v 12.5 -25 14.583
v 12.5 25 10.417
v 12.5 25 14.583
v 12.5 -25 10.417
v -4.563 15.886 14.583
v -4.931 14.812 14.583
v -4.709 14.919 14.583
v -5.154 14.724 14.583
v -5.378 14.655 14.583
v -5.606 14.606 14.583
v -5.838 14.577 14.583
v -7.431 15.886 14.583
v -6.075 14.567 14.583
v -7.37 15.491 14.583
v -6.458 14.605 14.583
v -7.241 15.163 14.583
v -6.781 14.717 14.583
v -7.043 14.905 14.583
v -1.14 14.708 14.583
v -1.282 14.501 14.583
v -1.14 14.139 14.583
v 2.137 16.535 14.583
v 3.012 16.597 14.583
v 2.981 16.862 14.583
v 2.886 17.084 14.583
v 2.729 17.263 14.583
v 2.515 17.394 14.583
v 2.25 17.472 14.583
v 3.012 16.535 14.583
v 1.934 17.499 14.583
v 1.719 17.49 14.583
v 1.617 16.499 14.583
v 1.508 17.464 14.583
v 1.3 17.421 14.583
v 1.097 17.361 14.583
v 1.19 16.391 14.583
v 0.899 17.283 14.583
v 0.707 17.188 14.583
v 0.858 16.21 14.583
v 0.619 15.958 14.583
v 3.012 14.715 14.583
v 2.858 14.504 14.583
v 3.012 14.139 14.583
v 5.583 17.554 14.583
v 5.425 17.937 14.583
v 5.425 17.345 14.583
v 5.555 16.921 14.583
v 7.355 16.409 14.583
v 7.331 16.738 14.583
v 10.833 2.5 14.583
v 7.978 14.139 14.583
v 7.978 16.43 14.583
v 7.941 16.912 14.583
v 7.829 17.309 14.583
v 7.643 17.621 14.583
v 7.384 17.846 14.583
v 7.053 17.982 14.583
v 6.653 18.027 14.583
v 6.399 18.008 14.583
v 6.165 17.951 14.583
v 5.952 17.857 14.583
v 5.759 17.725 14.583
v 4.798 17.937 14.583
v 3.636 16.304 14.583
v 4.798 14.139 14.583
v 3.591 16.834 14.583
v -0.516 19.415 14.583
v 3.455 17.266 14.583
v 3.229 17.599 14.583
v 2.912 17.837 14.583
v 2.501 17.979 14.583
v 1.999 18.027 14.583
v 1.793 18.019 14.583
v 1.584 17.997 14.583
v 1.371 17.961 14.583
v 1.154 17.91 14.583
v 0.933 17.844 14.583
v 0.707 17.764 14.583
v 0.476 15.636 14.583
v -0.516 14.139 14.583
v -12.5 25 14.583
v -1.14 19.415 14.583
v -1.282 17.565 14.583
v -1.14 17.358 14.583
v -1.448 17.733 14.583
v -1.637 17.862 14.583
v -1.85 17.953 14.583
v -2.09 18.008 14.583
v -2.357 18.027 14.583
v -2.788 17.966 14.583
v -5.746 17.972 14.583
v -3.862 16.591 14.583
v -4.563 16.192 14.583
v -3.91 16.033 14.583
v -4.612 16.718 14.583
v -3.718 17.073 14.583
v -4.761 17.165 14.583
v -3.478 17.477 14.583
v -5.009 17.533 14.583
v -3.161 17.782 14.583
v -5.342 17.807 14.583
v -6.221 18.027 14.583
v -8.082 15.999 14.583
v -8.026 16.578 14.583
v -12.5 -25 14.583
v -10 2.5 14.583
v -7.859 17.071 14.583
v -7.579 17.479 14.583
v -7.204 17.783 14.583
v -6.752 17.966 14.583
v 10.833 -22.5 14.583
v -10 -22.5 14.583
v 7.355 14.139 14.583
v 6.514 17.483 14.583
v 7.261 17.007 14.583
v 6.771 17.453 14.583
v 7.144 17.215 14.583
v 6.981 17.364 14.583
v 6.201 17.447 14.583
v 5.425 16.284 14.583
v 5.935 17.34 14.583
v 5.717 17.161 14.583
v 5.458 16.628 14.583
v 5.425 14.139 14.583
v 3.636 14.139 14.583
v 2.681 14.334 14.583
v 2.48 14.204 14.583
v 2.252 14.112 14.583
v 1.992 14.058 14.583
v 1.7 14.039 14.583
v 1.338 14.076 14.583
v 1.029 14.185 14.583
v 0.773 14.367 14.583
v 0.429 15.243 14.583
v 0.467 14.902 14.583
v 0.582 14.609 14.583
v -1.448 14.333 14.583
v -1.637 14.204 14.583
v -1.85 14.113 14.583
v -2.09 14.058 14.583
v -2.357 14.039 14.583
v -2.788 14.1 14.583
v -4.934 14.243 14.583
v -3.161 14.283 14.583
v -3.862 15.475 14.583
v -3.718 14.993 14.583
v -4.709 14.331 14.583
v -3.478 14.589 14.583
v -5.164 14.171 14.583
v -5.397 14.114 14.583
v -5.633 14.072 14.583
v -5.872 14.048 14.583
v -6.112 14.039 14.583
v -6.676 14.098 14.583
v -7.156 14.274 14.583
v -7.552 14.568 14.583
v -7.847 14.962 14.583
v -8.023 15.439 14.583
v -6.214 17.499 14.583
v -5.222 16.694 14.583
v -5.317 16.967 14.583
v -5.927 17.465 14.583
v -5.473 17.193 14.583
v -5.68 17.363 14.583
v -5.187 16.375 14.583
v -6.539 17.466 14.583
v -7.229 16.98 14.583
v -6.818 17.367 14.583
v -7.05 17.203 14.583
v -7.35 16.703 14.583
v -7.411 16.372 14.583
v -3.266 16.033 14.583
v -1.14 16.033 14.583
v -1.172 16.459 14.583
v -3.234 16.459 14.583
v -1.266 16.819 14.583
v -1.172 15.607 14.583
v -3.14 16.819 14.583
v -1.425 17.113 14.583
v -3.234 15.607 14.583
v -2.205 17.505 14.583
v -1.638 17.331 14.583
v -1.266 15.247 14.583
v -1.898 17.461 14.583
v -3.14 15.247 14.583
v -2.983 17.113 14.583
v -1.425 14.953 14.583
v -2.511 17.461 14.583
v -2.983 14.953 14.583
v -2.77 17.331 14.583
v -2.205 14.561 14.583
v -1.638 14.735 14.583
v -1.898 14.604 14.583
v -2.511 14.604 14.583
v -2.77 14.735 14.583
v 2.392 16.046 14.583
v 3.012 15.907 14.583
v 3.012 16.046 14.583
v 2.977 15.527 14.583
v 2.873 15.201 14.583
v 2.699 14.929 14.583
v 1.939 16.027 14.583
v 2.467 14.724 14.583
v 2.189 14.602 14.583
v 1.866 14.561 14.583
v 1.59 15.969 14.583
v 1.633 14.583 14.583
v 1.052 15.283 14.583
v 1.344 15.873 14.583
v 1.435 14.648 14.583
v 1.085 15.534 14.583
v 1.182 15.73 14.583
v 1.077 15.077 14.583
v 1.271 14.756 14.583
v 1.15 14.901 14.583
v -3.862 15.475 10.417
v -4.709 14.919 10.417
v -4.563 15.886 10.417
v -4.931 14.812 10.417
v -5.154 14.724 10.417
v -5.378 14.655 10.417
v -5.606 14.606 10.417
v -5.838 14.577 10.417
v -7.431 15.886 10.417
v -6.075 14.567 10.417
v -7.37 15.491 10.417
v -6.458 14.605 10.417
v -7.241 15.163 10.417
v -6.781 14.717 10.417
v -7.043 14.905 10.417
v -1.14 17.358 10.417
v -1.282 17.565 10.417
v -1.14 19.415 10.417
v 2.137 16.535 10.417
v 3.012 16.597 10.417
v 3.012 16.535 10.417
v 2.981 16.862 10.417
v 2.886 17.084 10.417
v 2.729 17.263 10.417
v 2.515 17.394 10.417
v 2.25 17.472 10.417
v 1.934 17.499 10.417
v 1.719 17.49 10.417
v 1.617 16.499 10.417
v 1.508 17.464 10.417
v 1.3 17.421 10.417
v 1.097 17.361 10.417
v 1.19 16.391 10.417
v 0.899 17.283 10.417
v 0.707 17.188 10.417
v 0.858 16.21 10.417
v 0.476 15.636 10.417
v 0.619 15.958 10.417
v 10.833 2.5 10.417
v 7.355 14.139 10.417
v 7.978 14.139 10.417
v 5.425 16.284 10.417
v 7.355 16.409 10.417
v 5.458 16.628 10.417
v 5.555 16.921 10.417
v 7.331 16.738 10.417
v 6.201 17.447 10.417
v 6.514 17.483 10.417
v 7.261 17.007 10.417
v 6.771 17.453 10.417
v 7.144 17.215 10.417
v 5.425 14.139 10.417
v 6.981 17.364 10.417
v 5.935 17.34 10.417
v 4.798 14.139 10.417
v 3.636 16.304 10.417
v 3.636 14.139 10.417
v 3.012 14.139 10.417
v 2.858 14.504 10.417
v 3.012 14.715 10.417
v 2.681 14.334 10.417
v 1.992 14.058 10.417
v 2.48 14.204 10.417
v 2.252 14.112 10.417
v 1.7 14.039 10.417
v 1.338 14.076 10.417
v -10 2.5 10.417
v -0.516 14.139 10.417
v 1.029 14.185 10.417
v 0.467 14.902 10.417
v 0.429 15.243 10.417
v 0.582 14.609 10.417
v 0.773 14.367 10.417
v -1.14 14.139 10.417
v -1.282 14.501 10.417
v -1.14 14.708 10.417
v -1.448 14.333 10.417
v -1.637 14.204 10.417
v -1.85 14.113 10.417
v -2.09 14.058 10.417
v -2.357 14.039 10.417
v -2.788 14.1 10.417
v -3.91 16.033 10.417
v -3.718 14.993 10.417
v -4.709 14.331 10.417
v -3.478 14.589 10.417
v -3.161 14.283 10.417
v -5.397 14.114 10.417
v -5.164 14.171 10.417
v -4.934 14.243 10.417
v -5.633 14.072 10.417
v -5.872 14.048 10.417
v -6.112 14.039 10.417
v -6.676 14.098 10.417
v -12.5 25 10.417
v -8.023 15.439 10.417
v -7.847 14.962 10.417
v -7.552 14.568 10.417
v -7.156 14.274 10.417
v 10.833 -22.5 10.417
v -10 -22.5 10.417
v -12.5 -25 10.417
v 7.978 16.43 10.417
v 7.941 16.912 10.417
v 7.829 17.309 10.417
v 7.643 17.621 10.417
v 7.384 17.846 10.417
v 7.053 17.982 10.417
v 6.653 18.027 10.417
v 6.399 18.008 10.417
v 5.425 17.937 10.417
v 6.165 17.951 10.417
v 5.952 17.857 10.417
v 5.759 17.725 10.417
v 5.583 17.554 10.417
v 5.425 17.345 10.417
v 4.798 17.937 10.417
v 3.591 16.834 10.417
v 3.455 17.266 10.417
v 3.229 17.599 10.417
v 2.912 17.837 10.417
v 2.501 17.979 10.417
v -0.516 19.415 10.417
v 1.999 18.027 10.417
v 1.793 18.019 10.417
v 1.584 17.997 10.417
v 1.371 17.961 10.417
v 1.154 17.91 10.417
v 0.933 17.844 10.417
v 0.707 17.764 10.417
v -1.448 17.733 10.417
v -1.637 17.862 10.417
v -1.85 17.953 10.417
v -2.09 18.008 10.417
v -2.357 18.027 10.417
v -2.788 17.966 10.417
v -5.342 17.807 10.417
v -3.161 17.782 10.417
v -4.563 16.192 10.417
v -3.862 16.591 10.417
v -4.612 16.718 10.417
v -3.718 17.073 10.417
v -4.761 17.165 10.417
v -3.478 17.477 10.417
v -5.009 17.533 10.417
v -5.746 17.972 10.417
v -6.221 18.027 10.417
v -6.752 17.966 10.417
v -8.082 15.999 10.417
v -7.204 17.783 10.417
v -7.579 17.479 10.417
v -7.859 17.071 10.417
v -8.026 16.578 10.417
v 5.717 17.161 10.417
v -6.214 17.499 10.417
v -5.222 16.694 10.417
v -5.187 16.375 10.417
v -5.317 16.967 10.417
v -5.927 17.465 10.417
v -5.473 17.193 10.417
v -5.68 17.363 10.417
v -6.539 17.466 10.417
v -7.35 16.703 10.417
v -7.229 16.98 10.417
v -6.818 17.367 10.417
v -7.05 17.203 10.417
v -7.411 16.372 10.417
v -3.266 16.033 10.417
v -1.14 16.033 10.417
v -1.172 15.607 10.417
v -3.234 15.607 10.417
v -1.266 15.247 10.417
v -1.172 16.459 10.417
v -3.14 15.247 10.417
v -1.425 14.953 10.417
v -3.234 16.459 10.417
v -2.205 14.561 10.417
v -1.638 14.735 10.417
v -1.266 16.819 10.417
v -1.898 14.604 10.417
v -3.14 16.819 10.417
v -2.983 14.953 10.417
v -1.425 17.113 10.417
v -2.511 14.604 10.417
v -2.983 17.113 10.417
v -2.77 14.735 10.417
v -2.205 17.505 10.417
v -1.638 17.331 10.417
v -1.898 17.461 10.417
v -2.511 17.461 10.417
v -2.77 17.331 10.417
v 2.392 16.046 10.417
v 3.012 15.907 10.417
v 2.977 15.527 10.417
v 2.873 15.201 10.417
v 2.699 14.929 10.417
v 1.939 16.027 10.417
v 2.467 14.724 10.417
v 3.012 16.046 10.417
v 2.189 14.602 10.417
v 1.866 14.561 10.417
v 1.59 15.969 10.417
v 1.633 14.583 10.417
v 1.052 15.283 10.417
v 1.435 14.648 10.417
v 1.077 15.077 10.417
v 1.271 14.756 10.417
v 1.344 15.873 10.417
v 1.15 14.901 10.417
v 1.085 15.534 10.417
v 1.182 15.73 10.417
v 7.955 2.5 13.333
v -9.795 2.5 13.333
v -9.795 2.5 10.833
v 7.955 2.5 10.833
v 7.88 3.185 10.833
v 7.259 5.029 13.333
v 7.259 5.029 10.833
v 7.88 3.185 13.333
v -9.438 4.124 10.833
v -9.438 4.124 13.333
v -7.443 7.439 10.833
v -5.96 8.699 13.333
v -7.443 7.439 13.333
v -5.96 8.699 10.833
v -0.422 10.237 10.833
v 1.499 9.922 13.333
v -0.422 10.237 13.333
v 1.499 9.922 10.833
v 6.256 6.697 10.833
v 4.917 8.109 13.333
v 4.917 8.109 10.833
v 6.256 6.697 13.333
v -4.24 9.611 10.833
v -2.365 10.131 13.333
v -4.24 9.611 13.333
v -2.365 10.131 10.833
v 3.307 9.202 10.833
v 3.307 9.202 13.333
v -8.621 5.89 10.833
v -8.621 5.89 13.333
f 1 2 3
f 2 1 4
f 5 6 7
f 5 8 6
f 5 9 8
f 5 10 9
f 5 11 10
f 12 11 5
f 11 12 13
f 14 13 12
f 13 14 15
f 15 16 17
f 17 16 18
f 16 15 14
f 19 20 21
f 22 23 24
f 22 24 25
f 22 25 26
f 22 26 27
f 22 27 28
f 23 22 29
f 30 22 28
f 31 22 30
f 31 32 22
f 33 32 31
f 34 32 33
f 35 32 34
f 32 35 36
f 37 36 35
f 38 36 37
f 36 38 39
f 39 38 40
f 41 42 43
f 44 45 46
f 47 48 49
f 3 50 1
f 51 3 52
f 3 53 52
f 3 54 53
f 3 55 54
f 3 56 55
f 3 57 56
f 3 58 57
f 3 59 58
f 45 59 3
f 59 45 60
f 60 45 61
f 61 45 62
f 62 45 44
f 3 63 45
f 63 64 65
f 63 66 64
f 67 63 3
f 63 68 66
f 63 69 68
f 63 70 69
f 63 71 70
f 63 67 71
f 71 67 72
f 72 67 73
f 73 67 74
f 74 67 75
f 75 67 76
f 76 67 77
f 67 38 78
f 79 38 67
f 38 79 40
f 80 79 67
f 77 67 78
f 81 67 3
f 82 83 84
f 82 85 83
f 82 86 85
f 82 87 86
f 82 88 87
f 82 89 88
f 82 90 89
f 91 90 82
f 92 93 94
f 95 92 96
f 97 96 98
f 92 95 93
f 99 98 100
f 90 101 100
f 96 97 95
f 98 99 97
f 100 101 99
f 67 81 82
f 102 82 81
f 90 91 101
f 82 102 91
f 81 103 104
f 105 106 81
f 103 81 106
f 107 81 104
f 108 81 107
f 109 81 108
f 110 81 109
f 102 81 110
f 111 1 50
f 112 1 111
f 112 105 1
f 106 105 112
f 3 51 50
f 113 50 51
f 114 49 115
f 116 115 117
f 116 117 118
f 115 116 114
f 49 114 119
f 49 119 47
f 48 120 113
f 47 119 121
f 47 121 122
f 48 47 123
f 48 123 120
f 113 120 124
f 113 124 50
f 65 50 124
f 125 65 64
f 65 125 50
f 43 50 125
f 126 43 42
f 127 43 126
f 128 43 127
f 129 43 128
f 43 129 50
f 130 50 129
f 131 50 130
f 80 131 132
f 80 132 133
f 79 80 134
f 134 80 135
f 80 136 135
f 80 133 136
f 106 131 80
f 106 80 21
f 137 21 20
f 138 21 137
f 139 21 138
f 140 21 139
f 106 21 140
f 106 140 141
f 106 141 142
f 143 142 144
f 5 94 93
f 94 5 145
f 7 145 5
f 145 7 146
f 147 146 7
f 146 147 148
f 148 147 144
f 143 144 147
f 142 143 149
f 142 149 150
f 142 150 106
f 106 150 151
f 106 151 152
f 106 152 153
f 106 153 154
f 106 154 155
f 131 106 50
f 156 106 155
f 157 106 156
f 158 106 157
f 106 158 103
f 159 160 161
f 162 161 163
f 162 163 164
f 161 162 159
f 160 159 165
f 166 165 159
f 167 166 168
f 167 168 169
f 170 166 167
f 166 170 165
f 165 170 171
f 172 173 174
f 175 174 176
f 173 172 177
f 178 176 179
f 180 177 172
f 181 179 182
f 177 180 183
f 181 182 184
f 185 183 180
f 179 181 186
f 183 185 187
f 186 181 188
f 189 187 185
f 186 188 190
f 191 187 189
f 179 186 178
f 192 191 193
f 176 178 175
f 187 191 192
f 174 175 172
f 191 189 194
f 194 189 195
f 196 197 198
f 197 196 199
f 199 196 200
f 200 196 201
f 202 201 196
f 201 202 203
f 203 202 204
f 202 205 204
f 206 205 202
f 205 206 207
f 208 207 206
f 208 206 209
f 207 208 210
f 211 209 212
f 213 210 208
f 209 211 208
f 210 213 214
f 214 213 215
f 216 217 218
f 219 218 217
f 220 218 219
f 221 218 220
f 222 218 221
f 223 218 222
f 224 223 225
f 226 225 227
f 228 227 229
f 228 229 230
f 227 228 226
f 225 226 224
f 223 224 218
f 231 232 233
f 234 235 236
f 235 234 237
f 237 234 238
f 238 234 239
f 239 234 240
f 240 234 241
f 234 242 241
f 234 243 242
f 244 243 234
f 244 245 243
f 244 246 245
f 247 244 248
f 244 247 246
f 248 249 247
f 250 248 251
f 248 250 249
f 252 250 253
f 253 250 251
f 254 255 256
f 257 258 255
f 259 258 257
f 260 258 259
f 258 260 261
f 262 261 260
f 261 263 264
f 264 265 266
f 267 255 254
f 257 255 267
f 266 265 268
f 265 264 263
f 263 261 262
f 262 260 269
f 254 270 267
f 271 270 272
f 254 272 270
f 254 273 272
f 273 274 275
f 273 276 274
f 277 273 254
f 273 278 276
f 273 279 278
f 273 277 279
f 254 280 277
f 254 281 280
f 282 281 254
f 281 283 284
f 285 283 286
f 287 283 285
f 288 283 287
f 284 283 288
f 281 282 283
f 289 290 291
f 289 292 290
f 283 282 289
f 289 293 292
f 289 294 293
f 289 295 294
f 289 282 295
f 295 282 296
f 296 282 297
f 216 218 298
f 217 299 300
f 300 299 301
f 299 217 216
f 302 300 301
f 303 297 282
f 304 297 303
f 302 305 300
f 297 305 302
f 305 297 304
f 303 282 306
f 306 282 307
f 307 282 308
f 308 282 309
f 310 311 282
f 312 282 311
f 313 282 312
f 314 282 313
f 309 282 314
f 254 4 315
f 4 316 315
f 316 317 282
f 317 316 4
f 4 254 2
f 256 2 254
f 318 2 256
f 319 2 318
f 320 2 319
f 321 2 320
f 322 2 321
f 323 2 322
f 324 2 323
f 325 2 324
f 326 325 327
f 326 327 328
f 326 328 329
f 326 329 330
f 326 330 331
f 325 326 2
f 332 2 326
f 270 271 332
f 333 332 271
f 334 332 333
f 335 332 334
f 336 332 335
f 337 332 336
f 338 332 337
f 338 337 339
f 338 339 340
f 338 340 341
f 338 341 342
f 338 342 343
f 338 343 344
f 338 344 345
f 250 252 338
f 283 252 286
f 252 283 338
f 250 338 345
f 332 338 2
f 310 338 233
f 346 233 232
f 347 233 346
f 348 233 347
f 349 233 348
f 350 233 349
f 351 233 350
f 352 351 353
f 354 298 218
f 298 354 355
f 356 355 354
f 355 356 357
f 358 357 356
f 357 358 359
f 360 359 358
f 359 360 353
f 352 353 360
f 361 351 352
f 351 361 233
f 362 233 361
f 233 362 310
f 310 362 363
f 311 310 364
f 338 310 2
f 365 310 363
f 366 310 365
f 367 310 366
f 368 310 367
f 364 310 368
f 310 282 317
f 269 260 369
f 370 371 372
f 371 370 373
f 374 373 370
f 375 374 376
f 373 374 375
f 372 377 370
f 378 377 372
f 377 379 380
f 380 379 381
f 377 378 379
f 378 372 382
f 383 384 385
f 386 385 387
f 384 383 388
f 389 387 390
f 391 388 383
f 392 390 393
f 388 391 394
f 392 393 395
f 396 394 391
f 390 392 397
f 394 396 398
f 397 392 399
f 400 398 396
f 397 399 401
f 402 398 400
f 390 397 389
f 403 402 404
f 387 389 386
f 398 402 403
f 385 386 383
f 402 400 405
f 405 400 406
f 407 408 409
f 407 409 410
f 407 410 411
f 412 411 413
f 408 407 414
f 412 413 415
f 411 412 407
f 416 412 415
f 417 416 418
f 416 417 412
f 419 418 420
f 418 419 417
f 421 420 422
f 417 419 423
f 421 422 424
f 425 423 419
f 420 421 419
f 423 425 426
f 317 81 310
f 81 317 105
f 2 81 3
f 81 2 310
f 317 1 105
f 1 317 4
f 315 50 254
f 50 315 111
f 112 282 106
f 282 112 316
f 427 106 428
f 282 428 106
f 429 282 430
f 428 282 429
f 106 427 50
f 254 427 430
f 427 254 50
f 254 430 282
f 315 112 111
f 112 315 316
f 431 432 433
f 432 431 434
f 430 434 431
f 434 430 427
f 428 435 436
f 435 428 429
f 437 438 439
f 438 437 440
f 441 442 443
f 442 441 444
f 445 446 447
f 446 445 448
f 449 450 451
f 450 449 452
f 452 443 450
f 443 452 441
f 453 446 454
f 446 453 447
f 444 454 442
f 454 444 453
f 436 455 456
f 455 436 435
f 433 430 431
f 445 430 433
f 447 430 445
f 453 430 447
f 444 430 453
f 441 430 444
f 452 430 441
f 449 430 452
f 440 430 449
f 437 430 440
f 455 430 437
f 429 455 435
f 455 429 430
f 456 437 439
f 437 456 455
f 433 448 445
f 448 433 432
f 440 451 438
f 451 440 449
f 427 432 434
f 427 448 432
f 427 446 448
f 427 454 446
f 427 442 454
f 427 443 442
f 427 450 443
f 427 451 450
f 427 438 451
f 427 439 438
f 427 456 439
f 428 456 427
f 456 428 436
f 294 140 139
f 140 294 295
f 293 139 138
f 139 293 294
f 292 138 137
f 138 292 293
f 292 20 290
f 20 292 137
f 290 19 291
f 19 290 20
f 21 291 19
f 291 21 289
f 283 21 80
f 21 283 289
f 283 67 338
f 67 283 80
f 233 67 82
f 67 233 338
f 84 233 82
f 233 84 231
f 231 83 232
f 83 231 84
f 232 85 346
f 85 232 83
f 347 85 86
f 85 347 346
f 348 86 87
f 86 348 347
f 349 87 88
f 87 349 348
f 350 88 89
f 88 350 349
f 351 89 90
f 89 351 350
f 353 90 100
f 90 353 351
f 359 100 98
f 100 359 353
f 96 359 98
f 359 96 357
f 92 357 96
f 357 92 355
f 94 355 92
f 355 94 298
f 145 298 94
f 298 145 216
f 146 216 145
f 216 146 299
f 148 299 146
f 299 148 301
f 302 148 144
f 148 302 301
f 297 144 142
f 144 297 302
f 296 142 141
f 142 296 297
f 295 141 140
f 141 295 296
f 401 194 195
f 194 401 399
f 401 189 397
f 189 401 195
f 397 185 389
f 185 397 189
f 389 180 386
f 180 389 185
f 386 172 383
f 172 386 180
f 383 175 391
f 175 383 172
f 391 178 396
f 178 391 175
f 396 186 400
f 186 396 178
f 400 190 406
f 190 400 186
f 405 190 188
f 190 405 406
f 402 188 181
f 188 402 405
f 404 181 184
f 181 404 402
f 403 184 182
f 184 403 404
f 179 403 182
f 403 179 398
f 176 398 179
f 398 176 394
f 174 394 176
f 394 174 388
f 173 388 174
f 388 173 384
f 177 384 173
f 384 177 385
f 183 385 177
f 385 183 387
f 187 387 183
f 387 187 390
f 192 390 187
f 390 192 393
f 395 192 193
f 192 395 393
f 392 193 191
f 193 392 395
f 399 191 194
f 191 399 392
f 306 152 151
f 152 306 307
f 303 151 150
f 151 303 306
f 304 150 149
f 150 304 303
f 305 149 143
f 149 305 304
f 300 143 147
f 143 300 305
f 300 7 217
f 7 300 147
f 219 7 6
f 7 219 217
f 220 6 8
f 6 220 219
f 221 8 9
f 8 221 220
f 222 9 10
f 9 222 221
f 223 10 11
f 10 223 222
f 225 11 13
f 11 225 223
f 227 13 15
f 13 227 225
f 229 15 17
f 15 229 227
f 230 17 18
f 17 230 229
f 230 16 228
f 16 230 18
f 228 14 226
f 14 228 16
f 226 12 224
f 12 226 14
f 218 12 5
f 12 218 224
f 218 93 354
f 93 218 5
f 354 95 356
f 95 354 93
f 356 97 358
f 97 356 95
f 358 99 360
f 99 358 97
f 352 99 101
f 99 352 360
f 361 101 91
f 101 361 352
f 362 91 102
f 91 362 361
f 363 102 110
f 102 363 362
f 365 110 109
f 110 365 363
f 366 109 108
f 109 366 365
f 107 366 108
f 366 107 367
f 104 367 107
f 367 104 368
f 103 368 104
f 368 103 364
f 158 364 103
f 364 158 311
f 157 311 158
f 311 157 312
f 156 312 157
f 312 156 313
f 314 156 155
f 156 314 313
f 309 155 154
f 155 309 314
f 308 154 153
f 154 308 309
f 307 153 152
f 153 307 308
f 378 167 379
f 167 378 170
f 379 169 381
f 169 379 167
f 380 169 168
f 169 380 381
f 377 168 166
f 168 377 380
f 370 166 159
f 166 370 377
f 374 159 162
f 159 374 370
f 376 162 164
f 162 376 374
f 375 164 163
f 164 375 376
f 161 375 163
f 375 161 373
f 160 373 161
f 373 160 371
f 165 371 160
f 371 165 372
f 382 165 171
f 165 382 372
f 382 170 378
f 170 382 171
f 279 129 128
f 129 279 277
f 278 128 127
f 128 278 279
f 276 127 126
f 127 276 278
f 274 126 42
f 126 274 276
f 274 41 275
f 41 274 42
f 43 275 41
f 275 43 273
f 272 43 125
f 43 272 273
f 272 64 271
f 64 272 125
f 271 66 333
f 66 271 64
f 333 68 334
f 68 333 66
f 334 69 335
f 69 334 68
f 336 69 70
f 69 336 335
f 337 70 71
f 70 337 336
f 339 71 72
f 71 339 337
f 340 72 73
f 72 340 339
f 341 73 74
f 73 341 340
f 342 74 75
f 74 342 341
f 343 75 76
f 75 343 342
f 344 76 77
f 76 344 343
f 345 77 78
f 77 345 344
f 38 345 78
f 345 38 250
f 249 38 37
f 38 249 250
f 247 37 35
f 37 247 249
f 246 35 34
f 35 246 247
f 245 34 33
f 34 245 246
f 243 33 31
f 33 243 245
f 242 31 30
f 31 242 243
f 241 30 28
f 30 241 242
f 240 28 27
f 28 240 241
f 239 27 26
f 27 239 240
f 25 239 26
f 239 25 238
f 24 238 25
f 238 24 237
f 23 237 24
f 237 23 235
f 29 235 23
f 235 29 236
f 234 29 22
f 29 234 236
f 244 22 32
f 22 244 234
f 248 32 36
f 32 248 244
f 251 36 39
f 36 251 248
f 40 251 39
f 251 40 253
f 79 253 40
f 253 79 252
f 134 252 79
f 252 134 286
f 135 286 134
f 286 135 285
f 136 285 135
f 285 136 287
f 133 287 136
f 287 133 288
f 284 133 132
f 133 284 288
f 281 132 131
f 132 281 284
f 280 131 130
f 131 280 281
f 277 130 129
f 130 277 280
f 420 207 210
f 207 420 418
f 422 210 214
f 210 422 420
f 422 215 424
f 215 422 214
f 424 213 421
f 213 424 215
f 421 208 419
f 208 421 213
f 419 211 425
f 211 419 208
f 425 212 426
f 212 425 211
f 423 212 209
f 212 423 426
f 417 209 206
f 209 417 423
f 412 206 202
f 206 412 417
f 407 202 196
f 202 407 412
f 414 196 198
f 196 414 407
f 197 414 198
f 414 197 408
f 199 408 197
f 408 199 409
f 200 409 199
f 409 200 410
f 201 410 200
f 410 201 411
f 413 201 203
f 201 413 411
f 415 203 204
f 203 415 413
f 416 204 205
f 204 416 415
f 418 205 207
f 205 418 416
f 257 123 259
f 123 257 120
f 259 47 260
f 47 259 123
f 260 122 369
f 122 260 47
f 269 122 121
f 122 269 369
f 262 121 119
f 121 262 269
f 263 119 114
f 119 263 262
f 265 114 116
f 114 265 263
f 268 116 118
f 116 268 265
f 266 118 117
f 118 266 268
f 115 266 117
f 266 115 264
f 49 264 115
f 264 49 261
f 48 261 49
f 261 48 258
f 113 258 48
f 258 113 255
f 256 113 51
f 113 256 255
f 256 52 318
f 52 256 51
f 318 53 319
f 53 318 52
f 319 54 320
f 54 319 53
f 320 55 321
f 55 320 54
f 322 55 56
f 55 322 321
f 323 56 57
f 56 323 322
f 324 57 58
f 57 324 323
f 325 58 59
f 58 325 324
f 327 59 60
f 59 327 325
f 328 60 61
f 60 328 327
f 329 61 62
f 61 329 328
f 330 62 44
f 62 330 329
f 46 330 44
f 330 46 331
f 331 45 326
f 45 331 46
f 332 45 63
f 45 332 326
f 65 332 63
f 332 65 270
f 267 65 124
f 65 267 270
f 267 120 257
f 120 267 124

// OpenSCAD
basic_opener("edan");


module basic_opener(letter, size=50) {
    coin_radius = 9;
    coin_height = 2;
    padding = 2.5;
    difference() {
        translate([0,0,size/4]) cube([size/2,size,size/12], center=true); // cube
        translate([-size/4+padding,-size/2+padding,0]) cube([size/2.4,size/2,size]); // frame 
        translate([-size/55,size/40,size/6+padding]) cylinder(h=size/20, r=coin_radius); // coin hole
        translate([0,size/3,size/6]) {
            linear_extrude(height=size, convexity=4)
                text(letter, 
                     size=size*0.1,
                     font="Bitstream Vera Sans",
                     halign="center",
                     valign="center");
        }
    }
}
